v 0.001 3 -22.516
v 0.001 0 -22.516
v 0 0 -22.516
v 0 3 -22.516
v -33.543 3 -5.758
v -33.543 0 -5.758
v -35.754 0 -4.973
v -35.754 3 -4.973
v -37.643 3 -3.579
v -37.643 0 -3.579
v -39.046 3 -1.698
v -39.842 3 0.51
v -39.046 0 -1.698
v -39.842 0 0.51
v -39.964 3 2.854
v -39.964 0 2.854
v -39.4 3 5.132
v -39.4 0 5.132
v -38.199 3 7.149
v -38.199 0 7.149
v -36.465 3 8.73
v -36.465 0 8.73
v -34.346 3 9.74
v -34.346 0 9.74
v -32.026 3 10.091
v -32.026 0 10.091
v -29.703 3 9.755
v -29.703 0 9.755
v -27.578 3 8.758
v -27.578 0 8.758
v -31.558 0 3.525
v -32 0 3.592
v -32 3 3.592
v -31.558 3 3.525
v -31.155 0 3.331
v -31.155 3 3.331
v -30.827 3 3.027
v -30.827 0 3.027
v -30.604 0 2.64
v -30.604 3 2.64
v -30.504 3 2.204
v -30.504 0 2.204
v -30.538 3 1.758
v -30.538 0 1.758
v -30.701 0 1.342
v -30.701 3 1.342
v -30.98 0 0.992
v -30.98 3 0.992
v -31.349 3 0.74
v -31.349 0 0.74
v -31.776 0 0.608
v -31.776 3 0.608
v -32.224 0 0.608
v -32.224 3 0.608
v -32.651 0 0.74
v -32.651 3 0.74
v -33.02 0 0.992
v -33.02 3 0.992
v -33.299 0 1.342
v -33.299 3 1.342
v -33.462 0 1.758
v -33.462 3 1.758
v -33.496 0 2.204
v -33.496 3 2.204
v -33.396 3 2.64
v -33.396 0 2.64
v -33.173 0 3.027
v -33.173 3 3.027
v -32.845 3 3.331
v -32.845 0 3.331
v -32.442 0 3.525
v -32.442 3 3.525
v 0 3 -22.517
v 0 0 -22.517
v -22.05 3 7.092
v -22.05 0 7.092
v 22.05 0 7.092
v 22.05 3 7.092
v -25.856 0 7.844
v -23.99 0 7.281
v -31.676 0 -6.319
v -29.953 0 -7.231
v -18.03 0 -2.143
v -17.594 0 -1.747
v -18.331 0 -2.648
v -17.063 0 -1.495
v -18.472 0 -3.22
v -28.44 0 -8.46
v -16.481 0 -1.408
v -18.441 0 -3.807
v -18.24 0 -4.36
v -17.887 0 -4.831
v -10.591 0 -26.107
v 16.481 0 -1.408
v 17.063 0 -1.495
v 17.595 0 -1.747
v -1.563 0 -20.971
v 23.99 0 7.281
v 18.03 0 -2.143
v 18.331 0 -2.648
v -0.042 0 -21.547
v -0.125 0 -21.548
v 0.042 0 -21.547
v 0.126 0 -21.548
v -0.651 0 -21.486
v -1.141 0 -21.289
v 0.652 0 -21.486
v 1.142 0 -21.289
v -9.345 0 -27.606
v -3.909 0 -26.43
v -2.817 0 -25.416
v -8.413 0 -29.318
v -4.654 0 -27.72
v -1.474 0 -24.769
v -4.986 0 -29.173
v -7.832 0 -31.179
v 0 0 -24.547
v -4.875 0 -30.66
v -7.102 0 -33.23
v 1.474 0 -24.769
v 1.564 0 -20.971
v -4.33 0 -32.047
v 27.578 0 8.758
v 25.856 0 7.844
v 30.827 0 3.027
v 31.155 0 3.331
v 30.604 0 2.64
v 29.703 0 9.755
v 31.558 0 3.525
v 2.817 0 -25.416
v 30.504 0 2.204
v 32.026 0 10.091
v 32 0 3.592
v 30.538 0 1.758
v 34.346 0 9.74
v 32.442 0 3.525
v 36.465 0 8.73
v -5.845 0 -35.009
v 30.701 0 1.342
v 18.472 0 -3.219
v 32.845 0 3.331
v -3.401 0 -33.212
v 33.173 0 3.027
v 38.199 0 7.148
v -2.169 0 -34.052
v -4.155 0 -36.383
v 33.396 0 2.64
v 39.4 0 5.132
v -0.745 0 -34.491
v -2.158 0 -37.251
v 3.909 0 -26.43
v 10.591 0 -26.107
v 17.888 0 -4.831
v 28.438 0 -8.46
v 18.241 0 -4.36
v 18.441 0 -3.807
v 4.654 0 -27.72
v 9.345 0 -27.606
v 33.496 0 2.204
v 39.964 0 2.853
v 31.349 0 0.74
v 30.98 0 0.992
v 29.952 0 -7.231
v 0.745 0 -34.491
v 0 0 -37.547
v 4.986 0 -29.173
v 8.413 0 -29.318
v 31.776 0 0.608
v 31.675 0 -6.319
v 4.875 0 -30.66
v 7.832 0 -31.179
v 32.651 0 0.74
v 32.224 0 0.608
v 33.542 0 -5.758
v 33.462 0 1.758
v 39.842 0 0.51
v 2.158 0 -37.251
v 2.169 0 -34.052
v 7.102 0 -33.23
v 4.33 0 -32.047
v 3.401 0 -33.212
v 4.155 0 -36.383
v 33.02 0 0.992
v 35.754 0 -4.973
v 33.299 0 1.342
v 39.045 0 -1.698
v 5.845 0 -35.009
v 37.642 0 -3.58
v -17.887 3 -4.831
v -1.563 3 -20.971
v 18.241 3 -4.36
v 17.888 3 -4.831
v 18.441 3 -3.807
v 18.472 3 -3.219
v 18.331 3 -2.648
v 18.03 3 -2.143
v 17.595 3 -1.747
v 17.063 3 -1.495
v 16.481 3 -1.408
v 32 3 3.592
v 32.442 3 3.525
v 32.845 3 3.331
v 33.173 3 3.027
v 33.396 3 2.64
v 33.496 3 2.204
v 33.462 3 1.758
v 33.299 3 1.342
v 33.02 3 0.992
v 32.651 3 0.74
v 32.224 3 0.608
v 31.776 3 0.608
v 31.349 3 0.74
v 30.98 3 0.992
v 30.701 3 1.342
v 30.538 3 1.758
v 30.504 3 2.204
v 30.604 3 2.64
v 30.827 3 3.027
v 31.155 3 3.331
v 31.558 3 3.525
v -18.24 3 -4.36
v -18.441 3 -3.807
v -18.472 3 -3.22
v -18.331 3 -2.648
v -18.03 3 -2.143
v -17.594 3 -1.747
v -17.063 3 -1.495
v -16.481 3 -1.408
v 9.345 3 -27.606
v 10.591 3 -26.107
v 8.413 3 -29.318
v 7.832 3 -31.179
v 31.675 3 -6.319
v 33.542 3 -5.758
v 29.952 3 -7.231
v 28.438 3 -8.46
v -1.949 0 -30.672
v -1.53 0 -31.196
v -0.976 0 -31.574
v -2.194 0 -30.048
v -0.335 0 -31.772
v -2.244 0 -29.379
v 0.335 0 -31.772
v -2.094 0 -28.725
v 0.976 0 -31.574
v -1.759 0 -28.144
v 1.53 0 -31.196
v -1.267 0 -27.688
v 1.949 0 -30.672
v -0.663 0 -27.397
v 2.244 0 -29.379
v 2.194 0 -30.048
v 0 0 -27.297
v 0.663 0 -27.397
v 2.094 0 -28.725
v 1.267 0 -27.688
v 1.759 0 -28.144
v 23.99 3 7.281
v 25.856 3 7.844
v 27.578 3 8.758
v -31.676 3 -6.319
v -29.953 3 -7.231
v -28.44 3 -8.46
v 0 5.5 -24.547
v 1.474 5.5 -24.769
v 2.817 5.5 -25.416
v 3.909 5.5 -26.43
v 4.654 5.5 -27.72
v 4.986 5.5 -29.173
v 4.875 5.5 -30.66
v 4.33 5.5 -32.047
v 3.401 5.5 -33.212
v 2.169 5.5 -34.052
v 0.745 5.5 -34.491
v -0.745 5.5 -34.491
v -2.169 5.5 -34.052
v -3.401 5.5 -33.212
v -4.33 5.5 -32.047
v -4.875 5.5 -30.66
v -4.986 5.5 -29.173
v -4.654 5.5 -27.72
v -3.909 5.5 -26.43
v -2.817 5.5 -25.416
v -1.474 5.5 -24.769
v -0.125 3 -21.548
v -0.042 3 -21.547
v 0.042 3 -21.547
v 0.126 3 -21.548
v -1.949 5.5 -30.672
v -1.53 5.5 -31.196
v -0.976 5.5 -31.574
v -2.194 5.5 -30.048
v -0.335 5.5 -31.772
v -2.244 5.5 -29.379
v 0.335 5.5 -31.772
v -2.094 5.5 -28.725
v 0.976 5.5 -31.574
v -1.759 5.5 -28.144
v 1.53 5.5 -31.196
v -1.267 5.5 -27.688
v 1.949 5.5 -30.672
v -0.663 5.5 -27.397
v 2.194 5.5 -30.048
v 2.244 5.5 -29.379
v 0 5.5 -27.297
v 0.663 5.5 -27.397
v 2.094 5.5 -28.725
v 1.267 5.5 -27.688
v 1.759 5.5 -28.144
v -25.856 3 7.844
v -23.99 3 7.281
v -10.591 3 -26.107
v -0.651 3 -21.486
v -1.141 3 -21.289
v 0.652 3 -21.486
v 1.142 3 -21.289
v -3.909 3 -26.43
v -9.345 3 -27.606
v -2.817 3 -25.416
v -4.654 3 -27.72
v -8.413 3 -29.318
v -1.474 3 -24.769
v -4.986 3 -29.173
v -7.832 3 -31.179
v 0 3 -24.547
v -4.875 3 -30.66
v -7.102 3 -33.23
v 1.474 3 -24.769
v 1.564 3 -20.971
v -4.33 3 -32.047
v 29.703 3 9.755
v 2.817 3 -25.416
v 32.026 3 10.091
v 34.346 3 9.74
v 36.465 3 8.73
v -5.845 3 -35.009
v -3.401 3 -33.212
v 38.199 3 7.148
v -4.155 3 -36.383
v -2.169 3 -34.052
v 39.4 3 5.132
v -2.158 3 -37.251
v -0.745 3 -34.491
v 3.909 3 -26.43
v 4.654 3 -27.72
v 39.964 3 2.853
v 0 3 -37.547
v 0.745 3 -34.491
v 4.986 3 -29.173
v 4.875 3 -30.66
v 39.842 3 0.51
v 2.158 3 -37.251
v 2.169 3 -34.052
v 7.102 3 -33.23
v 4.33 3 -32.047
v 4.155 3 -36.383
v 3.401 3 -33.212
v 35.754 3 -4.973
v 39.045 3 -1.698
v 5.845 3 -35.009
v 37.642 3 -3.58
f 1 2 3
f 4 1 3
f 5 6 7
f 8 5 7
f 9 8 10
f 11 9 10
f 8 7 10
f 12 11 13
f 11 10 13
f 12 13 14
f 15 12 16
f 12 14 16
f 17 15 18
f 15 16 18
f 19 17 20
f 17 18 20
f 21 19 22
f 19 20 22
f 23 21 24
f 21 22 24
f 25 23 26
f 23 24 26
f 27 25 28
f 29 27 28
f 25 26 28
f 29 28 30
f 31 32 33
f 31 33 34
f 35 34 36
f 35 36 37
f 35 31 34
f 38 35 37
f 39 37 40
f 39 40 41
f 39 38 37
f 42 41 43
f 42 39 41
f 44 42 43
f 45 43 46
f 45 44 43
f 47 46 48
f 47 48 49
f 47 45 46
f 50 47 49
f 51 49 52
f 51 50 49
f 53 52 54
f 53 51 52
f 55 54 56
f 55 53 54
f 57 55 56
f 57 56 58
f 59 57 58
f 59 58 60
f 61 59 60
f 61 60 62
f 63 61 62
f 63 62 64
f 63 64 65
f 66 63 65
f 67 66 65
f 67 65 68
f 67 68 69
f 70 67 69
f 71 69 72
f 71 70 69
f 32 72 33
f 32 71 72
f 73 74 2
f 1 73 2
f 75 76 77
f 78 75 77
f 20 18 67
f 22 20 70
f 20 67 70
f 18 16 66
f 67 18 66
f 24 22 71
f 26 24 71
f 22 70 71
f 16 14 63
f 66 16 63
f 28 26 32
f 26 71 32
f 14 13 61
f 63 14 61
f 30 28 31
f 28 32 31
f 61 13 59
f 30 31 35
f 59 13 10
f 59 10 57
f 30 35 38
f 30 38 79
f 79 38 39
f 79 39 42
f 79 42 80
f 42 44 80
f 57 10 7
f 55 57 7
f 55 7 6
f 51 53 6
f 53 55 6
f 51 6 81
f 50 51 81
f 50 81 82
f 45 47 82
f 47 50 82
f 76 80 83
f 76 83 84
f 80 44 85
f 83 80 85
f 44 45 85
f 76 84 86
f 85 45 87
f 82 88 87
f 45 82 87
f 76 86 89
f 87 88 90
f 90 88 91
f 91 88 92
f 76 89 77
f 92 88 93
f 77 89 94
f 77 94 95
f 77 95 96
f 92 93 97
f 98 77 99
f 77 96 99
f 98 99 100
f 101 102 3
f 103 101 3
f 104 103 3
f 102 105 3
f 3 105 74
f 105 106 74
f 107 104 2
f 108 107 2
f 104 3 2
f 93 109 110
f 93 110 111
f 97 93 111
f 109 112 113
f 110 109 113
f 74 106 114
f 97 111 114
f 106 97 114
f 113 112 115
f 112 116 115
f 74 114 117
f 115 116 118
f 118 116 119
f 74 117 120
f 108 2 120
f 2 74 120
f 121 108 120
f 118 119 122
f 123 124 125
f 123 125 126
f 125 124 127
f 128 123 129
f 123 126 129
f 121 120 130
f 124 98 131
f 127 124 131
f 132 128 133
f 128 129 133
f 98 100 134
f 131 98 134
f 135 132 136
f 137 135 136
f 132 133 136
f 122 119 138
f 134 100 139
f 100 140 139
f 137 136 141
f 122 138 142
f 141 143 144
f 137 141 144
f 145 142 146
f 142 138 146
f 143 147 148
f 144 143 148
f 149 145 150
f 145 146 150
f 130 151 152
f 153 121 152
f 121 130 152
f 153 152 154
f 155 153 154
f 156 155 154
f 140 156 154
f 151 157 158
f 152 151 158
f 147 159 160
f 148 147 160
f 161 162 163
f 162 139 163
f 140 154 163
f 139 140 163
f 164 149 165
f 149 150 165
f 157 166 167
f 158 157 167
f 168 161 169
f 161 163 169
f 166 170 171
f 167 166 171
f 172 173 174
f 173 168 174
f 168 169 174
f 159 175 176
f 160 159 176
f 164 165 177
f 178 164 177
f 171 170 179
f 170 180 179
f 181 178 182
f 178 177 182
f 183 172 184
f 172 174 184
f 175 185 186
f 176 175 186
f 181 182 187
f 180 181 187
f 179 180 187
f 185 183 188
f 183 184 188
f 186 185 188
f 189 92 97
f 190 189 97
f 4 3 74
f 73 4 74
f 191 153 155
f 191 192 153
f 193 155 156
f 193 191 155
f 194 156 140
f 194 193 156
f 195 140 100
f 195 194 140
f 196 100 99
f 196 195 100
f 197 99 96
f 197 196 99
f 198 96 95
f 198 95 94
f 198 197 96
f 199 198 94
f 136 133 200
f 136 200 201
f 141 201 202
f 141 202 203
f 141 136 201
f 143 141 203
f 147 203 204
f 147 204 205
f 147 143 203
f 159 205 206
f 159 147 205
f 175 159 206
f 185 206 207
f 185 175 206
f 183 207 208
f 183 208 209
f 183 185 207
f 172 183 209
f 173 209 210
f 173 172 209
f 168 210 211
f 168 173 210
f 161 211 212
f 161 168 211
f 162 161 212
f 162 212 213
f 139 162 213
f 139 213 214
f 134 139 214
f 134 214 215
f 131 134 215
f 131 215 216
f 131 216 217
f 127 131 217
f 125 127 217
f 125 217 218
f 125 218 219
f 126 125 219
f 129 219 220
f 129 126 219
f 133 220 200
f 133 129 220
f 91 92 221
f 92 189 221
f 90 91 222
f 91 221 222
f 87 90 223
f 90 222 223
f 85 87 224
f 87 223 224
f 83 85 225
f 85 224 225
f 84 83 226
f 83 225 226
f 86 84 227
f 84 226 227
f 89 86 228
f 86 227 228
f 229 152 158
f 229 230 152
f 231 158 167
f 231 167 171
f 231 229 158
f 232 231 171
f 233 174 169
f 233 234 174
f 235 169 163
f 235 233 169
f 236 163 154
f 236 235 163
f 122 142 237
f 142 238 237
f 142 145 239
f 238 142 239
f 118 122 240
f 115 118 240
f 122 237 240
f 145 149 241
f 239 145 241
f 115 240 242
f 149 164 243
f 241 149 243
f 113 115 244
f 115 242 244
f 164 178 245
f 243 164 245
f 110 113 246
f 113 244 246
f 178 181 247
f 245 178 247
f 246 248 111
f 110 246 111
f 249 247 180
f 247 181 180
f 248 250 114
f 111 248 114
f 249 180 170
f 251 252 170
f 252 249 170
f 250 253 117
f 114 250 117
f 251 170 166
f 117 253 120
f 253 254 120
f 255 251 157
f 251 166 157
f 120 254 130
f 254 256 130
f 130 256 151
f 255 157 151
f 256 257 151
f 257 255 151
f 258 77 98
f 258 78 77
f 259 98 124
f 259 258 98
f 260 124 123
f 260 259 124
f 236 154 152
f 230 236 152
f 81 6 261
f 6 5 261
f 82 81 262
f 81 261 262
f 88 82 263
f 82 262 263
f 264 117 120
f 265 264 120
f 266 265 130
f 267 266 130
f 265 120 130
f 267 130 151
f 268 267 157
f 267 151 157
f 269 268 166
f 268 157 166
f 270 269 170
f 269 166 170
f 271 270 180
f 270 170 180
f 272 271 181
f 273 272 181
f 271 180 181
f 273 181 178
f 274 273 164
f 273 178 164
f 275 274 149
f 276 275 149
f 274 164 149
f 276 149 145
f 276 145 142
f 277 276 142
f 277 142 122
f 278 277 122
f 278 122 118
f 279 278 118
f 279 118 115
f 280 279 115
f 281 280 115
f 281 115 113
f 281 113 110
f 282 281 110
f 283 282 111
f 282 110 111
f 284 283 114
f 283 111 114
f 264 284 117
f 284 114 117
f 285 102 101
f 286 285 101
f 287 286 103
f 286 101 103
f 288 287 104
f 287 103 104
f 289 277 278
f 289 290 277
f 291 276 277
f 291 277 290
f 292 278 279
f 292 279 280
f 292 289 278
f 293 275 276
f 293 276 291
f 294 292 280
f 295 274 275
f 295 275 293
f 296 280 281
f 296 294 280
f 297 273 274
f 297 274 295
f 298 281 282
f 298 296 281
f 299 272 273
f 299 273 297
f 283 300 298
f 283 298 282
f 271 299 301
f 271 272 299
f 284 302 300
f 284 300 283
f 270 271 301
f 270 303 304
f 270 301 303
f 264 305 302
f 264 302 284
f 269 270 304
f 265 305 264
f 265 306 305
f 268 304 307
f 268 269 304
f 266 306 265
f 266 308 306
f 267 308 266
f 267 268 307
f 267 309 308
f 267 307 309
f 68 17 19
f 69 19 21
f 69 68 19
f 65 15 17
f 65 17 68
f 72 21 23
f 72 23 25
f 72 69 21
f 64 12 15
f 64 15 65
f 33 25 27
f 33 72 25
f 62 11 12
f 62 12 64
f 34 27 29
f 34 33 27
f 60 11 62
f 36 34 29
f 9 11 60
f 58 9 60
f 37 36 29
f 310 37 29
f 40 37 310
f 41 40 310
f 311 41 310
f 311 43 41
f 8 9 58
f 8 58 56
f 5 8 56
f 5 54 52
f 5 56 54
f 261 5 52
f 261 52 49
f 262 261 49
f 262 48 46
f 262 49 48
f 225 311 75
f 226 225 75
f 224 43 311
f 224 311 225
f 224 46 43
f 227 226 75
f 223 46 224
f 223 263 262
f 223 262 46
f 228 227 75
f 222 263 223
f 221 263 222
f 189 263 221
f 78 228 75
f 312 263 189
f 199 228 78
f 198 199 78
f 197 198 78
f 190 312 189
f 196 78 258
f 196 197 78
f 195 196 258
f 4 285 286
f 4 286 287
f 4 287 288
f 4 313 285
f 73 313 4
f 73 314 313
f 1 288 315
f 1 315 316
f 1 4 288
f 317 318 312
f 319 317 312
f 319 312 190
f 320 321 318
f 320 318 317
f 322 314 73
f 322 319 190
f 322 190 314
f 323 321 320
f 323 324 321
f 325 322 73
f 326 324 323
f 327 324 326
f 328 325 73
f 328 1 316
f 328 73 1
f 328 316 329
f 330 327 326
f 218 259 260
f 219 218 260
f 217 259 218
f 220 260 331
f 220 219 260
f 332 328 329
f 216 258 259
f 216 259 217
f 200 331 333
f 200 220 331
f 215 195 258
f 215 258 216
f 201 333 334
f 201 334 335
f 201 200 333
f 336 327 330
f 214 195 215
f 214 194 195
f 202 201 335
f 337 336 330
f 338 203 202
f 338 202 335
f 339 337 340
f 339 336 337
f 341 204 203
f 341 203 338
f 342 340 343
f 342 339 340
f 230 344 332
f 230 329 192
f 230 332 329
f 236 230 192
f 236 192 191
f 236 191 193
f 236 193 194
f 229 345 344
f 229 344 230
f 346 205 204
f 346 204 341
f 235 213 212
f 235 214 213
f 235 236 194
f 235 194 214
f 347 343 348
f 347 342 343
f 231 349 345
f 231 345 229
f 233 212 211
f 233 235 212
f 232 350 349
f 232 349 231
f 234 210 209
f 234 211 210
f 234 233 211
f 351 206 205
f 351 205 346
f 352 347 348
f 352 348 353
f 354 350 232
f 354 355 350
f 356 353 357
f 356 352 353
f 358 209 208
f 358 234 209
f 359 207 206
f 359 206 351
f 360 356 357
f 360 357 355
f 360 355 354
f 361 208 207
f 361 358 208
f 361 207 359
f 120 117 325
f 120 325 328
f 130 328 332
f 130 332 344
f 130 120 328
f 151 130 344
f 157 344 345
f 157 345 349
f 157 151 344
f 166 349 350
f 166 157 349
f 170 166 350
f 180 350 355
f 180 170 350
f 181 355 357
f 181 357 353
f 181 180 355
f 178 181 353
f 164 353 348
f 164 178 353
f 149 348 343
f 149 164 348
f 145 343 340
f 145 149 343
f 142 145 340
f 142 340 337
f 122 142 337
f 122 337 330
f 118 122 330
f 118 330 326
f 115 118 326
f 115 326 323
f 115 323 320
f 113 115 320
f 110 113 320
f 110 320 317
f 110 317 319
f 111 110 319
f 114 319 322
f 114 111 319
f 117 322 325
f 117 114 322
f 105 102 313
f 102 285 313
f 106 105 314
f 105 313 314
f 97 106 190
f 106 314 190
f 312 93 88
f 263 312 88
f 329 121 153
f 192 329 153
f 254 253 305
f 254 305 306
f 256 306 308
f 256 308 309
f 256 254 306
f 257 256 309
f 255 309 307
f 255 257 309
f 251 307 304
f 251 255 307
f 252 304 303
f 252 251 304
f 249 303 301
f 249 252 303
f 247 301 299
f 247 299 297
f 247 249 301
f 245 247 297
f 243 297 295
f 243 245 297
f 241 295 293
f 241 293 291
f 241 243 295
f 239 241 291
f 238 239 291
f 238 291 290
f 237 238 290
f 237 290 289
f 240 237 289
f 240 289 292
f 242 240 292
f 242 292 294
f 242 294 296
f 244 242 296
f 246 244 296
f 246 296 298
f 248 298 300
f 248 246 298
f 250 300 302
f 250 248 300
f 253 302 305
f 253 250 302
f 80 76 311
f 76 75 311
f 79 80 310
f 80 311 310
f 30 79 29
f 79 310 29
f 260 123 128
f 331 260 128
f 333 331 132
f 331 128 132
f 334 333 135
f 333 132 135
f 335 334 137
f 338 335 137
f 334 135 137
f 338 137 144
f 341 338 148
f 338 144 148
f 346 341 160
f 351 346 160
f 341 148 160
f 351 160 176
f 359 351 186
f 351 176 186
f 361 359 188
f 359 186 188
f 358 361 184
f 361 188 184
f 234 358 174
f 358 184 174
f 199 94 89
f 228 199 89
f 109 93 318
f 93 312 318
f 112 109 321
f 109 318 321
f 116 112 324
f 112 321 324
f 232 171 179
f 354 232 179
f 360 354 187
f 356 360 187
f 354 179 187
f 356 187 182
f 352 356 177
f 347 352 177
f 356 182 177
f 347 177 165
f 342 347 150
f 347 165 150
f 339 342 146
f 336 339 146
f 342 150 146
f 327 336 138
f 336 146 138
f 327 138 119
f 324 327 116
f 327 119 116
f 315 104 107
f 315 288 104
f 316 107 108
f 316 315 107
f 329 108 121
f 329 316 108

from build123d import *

# Parameters (mm, degrees)
SKETCH2_R                = 1.5
SKETCH2_R_2              = 5
BOSS_EXTRUDE1_DEPTH      = 3
FILLET1_R                = 10
FILLET2_R                = 2
BOSS_EXTRUDE2_DEPTH      = 2.5
BOSS_EXTRUDE2_DEPTH_BACK = 3
SKETCH3_R                = 5
SKETCH3_R_2              = 2.25


with BuildPart() as part:
    # Sketch2 → Boss-Extrude1 (new body)
    with BuildSketch(Plane(origin=(0, 0, 0), x_dir=(1, 0, 0), z_dir=(0, 1, 0))):
        with BuildLine():
            Line((-25.755002002, -7.091520556), (25.755002002, -7.091520556))
            ThreePointArc((25.755002002, -7.091520556), (39.399896119, -5.131510265), (31.07348397, 5.854646321))
            Line((31.07348397, 5.854646321), (7.956268299, 28.711722383))
            ThreePointArc((7.956268299, 28.711722383), (8.3294e-05, 37.547063483), (-7.956285692, 28.711888061))
            Line((-7.956285692, 28.711888061), (-31.074510761, 5.854765977))
            ThreePointArc((-31.074510761, 5.854765977), (-39.399699694, -5.131988356), (-25.755002002, -7.091520556))
        make_face()
        with Locations(Location((-32, -2.091520556, 0), (0, 0, 270))):
            Circle(SKETCH2_R, mode=Mode.SUBTRACT)
        with Locations(Location((32, -2.091520556, 0), (0, 0, 270))):
            Circle(SKETCH2_R, mode=Mode.SUBTRACT)
        with BuildLine():
            Line((0.92651603, 21.600896605), (21.348745942, 1.408479444))
            Line((21.348745942, 1.408479444), (-21.34844873, 1.408479444))
            Line((-21.34844873, 1.408479444), (-0.925489239, 21.60077695))
            ThreePointArc((-0.925489239, 21.60077695), (0.00051687, 21.5470635), (0.92651603, 21.600896605))
        make_face(mode=Mode.SUBTRACT)
        Polygon((0, 22.515813483), (0, 22.516986487), (0.000593189, 22.516399973), align=None, mode=Mode.SUBTRACT)
        with Locations(Location((0, 29.547063483, 0), (0, 0, 270))):
            Circle(SKETCH2_R_2, mode=Mode.SUBTRACT)
    extrude(amount=BOSS_EXTRUDE1_DEPTH)

    # Fillet1
    fillet1_edges = [part.edges().sort_by_distance(p)[0] for p in [
        (-25.755002002, 1.5, 7.091520556),
        (-31.074510761, 1.5, -5.854765977),
        (-7.956285692, 1.5, -28.711888061),
        (7.956268299, 1.5, -28.711722383),
        (31.07348397, 1.5, -5.854646321),
        (25.755002002, 1.5, 7.091520556),
    ]]
    fillet(fillet1_edges, radius=FILLET1_R)

    # Fillet2
    fillet2_edges = [part.edges().sort_by_distance(p)[0] for p in [
        (0.92651603, 1.5, -21.600896605),
        (-0.925489239, 1.5, -21.60077695),
        (-21.34844873, 1.5, -1.408479444),
        (21.348745942, 1.5, -1.408479444),
    ]]
    fillet(fillet2_edges, radius=FILLET2_R)


with BuildPart() as body_2:
    # Sketch3 → Boss-Extrude2 (new, two sides: drawn at the far end of the back side and taken through both)
    with BuildSketch(Plane(origin=(0, 3, 0), x_dir=(1, 0, 0), z_dir=(0, 1, 0)).offset(-BOSS_EXTRUDE2_DEPTH_BACK)):
        with Locations(Location((0, 29.547063483, 0), (0, 0, 270))):
            Circle(SKETCH3_R)
        with Locations(Location((0, 29.547063483, 0), (0, 0, 270))):
            Circle(SKETCH3_R_2, mode=Mode.SUBTRACT)
    extrude(amount=BOSS_EXTRUDE2_DEPTH + BOSS_EXTRUDE2_DEPTH_BACK)


solid = Compound([part.part, body_2.part])
